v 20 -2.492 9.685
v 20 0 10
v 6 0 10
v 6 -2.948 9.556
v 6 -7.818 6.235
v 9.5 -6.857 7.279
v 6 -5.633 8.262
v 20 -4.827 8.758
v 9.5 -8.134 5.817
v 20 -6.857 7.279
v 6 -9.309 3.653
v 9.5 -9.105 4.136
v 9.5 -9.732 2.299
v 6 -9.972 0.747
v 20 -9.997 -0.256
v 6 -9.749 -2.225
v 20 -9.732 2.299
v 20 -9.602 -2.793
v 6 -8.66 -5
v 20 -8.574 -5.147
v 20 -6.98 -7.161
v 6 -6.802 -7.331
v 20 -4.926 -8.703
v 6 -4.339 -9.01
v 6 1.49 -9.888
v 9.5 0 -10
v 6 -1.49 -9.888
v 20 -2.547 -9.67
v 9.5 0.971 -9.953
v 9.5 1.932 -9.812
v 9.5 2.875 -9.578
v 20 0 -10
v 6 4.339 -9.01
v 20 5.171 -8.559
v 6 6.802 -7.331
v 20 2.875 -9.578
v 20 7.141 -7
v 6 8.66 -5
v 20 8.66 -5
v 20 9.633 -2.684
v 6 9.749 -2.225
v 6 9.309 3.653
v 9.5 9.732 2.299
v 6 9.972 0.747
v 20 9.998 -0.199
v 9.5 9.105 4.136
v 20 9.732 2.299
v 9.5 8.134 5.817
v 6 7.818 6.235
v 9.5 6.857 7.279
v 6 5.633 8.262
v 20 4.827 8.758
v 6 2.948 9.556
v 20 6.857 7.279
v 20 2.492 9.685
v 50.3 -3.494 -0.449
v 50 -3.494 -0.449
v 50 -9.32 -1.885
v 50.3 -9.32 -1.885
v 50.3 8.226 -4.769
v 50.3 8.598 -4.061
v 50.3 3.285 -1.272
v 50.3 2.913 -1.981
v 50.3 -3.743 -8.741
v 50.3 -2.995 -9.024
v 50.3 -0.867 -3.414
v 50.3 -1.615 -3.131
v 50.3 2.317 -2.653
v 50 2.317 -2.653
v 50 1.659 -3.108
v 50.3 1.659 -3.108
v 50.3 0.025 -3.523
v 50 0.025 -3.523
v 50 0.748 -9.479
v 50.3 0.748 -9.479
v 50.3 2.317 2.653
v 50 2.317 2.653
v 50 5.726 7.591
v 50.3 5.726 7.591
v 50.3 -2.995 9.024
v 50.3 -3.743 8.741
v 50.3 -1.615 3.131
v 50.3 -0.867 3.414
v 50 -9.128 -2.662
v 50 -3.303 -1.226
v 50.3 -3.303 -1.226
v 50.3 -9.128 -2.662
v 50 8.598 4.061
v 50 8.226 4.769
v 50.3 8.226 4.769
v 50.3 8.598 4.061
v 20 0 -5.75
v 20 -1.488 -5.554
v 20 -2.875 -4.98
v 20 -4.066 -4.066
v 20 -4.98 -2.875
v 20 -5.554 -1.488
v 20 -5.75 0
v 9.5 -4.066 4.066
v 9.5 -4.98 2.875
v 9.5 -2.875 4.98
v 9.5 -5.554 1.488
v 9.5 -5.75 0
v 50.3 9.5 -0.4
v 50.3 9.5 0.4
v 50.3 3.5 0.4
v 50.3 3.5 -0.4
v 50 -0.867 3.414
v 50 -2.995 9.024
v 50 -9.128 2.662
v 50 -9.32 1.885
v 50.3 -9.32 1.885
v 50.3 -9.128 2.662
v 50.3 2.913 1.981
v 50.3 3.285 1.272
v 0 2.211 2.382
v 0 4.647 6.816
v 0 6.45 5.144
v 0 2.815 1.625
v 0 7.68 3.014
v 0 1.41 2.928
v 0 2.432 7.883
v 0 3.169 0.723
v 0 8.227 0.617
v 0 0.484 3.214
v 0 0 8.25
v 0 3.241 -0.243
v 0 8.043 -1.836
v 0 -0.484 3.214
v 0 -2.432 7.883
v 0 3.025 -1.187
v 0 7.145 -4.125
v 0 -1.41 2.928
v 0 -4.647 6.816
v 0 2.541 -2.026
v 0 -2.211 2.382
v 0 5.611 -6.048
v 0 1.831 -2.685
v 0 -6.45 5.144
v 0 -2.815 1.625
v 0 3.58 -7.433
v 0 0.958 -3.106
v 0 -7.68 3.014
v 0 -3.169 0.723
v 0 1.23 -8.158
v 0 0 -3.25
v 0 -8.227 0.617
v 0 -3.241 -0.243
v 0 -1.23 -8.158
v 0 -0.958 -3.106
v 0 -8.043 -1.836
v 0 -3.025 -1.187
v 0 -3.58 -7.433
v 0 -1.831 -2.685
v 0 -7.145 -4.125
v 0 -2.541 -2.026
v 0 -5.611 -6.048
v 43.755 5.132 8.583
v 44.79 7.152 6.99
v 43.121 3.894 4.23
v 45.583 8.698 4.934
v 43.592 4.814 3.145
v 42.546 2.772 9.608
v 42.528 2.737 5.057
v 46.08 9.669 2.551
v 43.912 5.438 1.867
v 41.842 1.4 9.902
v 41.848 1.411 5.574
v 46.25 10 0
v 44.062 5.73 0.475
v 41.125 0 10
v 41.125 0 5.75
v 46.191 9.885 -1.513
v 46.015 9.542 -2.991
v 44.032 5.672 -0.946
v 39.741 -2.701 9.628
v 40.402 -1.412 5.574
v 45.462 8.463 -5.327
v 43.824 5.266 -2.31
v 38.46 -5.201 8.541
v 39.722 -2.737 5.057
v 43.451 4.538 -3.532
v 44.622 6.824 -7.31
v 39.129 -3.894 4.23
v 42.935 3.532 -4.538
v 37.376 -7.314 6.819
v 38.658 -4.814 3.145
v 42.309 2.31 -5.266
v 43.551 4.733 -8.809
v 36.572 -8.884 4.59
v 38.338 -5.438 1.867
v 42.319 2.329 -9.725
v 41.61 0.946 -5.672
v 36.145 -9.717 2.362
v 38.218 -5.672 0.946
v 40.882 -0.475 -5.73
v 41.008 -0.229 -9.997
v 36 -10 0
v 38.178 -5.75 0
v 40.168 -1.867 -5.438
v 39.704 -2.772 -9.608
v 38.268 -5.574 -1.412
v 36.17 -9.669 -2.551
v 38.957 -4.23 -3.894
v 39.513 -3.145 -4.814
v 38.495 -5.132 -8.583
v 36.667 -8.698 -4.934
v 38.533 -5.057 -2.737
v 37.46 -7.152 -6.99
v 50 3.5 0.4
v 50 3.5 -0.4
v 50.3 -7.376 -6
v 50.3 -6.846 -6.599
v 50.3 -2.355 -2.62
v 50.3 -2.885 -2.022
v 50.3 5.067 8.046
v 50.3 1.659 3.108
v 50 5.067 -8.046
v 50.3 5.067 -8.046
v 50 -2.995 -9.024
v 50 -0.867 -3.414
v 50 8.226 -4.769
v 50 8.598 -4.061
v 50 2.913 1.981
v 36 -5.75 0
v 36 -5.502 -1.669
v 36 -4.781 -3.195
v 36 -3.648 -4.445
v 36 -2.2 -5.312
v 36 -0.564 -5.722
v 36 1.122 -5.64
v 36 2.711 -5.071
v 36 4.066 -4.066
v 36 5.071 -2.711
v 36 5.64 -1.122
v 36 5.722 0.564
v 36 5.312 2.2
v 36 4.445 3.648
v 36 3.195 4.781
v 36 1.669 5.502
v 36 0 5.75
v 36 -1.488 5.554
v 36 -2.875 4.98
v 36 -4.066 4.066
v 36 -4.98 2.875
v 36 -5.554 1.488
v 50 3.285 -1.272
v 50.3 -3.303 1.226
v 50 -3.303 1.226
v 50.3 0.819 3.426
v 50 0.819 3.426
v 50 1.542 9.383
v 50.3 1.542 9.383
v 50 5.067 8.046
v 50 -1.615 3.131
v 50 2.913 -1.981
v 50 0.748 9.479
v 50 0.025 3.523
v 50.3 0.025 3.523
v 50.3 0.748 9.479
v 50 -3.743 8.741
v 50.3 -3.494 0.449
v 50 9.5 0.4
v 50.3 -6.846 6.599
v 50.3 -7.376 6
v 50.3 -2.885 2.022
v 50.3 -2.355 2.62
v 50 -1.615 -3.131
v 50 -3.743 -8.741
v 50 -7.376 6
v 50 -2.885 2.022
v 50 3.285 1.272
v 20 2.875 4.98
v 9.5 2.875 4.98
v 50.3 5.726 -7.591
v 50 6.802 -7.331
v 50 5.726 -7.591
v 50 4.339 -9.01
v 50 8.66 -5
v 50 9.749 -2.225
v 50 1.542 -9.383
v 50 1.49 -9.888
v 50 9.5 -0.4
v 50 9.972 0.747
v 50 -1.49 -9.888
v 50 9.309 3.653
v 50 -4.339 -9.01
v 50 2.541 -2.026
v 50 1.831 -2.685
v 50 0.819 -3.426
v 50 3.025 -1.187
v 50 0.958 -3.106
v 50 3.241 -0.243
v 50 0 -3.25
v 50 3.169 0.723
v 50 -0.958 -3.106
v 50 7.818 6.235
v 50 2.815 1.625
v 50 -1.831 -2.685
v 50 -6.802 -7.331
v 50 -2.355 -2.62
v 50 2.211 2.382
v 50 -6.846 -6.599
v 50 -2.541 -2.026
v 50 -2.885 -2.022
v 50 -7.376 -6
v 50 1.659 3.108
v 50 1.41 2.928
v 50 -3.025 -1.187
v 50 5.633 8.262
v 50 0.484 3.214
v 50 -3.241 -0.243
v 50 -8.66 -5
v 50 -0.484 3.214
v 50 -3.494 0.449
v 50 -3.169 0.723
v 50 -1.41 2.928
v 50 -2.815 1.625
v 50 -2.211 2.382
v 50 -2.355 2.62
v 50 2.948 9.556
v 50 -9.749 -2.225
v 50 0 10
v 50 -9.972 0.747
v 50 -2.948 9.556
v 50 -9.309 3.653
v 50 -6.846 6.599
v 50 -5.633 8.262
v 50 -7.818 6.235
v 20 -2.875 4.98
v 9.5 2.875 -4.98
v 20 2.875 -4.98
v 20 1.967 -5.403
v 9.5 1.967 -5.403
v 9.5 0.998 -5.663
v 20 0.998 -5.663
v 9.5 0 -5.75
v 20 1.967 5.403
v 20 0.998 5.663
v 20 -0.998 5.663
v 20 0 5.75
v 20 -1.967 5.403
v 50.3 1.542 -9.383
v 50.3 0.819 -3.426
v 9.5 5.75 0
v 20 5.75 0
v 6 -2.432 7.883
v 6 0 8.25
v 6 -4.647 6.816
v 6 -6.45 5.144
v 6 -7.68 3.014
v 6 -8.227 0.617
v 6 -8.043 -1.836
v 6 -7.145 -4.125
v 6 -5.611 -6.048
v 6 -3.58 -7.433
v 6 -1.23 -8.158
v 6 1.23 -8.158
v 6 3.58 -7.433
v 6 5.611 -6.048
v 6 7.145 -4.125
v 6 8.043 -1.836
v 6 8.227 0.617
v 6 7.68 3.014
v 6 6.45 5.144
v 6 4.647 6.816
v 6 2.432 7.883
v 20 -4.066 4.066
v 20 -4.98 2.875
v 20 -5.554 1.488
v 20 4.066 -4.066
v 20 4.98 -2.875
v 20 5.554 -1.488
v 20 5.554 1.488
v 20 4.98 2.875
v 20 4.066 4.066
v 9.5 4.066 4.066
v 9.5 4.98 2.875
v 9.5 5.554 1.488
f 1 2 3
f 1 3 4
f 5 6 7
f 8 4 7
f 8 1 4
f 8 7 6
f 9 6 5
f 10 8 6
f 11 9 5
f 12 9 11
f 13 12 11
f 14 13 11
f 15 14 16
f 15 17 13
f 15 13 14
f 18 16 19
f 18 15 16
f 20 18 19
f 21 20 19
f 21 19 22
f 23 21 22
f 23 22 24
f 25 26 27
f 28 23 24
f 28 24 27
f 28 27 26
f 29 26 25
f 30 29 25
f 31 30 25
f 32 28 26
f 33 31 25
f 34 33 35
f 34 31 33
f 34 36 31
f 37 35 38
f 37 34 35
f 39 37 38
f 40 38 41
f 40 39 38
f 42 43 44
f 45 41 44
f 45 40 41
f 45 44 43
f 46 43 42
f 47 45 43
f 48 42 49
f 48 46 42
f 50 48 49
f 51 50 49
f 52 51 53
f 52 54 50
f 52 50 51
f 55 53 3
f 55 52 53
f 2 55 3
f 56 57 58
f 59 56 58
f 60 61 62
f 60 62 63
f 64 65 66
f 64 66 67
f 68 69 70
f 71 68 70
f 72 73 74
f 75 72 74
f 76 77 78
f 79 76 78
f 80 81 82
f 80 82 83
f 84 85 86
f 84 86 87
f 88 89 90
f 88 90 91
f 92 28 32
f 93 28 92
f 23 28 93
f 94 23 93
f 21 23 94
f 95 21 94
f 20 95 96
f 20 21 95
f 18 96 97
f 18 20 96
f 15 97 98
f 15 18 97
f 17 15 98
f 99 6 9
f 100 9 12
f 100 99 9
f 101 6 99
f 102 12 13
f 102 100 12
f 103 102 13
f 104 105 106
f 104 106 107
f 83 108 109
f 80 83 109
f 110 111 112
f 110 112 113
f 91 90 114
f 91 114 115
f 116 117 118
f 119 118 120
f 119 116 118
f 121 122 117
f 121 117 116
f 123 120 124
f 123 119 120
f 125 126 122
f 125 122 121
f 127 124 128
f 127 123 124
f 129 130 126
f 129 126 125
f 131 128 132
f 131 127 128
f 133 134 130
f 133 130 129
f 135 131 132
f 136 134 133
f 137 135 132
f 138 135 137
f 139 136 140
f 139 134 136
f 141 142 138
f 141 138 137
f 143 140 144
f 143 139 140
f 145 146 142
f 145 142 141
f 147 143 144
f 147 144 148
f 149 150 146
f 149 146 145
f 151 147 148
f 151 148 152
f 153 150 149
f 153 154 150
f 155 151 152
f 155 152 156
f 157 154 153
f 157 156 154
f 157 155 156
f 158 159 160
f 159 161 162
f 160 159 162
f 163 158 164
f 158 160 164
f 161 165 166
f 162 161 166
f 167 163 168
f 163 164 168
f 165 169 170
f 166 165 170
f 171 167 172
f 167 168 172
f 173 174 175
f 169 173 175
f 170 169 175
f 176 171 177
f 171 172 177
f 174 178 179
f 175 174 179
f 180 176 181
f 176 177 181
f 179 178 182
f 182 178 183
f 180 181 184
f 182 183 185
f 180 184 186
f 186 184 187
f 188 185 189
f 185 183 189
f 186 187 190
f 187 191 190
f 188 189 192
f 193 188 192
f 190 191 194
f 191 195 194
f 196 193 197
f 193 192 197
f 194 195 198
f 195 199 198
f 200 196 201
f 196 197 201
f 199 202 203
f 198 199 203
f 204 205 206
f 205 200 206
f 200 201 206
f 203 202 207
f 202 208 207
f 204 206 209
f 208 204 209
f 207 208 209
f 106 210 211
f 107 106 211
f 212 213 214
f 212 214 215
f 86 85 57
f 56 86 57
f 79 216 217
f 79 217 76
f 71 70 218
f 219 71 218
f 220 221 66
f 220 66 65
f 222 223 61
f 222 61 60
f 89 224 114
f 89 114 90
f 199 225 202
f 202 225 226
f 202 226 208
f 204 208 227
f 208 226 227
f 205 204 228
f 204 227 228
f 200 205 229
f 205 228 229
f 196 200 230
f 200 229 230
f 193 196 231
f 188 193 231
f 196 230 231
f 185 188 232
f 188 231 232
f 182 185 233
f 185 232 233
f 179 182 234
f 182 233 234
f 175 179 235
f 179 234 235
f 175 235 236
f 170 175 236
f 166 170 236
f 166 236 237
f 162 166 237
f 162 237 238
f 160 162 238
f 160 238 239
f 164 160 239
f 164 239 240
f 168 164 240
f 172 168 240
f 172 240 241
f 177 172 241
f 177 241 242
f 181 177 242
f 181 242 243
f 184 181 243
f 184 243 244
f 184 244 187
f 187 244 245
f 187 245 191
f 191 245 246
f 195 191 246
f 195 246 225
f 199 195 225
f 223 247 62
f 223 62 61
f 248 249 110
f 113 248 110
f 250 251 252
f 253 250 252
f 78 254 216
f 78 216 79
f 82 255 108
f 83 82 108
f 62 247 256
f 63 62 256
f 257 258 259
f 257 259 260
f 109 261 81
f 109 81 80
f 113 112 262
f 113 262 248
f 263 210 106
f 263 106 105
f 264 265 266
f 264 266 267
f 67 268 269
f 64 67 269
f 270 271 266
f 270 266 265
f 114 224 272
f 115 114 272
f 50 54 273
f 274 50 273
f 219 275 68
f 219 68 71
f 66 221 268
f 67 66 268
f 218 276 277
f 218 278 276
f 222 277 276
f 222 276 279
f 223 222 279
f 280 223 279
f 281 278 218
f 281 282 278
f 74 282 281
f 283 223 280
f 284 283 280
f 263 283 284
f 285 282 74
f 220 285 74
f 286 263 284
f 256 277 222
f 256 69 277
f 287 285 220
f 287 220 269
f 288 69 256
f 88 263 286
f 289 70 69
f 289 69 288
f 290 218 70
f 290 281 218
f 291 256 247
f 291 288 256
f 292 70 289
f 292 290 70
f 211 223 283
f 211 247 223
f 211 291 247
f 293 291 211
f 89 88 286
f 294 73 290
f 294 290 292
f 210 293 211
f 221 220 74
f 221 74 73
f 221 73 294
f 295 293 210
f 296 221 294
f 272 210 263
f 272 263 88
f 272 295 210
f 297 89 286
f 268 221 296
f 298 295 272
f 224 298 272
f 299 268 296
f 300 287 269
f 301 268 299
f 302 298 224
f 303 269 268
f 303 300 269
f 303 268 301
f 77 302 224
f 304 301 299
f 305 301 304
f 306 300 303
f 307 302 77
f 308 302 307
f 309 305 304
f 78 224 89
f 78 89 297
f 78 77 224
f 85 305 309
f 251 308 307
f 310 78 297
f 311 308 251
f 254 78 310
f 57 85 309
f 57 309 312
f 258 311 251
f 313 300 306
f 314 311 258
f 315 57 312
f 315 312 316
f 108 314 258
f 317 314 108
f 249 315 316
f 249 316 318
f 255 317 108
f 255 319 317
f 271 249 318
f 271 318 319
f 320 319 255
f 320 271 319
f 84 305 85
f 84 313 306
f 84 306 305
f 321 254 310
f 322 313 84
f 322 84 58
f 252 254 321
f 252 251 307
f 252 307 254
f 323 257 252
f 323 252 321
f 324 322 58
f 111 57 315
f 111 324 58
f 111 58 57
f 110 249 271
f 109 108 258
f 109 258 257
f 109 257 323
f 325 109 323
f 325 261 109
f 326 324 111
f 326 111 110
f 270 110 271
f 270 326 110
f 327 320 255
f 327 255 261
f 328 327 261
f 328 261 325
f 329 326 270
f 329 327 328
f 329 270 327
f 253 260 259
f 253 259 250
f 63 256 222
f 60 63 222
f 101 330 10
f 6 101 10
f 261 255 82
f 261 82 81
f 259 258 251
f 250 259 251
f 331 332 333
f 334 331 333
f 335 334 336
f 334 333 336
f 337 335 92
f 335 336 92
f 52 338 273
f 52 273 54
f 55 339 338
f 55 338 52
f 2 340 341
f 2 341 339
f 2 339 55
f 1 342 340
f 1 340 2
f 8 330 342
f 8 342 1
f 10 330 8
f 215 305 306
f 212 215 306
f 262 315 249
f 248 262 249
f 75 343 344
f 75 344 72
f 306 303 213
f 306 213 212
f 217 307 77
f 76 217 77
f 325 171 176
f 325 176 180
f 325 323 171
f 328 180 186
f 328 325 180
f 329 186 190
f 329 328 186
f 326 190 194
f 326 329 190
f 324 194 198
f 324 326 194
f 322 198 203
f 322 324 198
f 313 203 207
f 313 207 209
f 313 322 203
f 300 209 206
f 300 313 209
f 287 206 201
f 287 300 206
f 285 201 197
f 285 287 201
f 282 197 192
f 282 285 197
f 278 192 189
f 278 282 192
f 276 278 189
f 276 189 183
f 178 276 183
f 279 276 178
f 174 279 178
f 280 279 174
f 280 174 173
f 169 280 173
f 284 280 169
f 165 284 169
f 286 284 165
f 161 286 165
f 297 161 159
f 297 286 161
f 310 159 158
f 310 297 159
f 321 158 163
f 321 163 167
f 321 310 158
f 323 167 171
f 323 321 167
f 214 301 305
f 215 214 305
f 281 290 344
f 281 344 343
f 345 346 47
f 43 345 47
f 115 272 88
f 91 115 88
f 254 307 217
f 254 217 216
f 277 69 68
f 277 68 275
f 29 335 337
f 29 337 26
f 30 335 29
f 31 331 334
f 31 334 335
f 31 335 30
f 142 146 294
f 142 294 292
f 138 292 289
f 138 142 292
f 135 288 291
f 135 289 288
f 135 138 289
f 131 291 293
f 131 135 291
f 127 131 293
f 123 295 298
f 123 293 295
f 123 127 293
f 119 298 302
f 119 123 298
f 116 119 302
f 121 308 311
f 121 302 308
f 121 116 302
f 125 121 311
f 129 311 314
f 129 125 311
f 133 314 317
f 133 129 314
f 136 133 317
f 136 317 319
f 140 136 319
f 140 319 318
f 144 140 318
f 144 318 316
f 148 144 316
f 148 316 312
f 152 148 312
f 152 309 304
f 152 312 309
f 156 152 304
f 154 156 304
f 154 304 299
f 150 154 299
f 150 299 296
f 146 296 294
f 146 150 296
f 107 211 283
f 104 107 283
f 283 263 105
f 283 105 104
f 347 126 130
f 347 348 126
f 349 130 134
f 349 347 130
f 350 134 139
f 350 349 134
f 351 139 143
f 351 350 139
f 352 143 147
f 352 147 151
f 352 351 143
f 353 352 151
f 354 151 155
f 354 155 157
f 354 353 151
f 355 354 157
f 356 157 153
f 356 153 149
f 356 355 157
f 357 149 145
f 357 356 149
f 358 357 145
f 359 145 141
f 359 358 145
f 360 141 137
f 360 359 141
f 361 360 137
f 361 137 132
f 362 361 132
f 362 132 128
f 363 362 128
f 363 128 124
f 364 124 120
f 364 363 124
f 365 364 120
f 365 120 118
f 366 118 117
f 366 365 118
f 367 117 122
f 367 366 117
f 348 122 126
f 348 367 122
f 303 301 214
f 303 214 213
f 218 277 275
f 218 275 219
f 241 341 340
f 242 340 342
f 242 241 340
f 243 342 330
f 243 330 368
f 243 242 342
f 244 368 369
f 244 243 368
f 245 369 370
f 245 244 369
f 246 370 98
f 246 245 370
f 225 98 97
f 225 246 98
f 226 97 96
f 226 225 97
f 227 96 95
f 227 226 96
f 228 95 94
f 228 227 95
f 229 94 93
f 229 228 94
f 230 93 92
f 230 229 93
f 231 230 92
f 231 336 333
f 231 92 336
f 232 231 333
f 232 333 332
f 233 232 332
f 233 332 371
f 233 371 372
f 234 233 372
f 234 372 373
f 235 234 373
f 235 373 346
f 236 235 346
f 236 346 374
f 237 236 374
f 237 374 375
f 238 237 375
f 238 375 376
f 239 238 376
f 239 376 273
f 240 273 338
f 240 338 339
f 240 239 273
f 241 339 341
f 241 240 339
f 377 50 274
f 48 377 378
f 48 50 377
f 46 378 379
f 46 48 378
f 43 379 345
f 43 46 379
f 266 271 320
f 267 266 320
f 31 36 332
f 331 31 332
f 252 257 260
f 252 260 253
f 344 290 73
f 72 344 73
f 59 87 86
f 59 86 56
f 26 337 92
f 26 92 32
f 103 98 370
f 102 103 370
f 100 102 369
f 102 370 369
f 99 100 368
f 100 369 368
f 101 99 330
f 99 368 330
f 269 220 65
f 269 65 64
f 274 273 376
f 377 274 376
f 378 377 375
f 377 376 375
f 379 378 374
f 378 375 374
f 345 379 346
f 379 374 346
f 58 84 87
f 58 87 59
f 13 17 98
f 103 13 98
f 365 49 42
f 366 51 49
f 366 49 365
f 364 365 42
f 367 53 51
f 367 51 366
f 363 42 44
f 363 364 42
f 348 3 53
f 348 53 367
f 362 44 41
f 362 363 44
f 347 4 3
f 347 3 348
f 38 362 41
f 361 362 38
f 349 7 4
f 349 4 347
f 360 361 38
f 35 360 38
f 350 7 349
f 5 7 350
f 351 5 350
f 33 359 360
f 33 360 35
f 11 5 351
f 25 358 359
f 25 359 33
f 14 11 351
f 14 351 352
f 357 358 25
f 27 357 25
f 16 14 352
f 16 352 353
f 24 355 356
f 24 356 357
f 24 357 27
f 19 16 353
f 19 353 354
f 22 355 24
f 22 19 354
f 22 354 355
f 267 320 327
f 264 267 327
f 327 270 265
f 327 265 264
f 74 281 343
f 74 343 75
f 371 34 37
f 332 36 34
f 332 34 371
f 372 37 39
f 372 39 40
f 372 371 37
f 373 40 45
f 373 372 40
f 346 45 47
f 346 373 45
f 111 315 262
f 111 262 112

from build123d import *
from build123d.topology import SkipClean

# Parameters (mm, degrees)
CUT_EXTRUDE_1_DEPTH      = 10.5
CUT_EXTRUDE_2_DEPTH      = 52.961524227
CUT_EXTRUDE_2_DEPTH_BACK = 52.961524227
EXTRUDE_1_REACH          = 40.678
SKETCH_4_R               = 5.75
CUT_EXTRUDE_3_DEPTH      = 52.961524227
CUT_EXTRUDE_3_DEPTH_BACK = 52.961524227
SKETCH_5_R               = 3.25
SKETCH_6_W               = 0.8
SKETCH_6_H               = 6
EXTRUDE_2_DEPTH          = 0.3
PATTERN_CIRCULAR_1_COUNT = 13


with BuildPart() as part:
    # 草图1 → 旋转1 (revolve)
    with BuildSketch(Plane.XY):
        Polygon((36, 0), (0, 0), (0, -8.25), (6, -8.25), (6, -10), (20, -10), (20, -5.75), (36, -5.75), align=None)
    revolve(axis=Axis((0, 0, 0), (1, 0, 0)))

    # 草图2 → 切除-拉伸1 (cut)
    with SkipClean():  # the faces are left unmerged after this step: merging them gives an invalid solid
        with BuildSketch(Plane(origin=(20, 0, 0), x_dir=(0, 0, -1), z_dir=(1, 0, 0))):
            with BuildLine():
                ThreePointArc((4.979646072, 2.875), (5.554073501, 1.488209509), (5.75, 0))
                Line((5.75, 0), (10, 0))
                ThreePointArc((10, 0), (9.893888613, 1.452917105), (9.577806377, 2.875))
                Line((9.577806377, 2.875), (4.979646072, 2.875))
            make_face()
            with BuildLine():
                ThreePointArc((-4.979646072, 2.875), (-2.875, 4.979646072), (0, 5.75))
                Line((0, 5.75), (-2.299080153, 9.732123635))
                ThreePointArc((-2.299080153, 9.732123635), (-5, 8.660254038), (-7.278726225, 6.857123635))
                Line((-7.278726225, 6.857123635), (-4.979646072, 2.875))
            make_face()
            with BuildLine():
                Line((-2.299080153, -9.732123635), (0, -5.75))
                ThreePointArc((0, -5.75), (-2.875, -4.979646072), (-4.979646072, -2.875))
                Line((-4.979646072, -2.875), (-7.278726225, -6.857123635))
                ThreePointArc((-7.278726225, -6.857123635), (-5, -8.660254038), (-2.299080153, -9.732123635))
            make_face()
        extrude(amount=-CUT_EXTRUDE_1_DEPTH, mode=Mode.SUBTRACT)


with BuildPart() as body_2:
    # 草图1<3> → 旋转2 (revolve)
    with BuildSketch(Plane.XY):
        Polygon((50, 0), (36, 0), (36, -5.75), (36, -10), (50, -10), align=None)
    revolve(axis=Axis((0, 0, 0), (1, 0, 0)))

    # 草图3 → 切除-拉伸2 (cut, two sides: drawn at the far end of the back side and taken through both)
    with BuildSketch(Plane.XY.offset(-CUT_EXTRUDE_2_DEPTH_BACK)):
        Polygon((36, -10), (36, 10), (46.25, 10), align=None)
    extrude(amount=CUT_EXTRUDE_2_DEPTH + CUT_EXTRUDE_2_DEPTH_BACK, mode=Mode.SUBTRACT)

    # 草图4 → 凸台-拉伸1 (add, up to next)
    with BuildSketch(Plane(origin=(36, 0, 0), x_dir=(0, 0, -1), z_dir=(1, 0, 0)), mode=Mode.PRIVATE) as extrude_1_sk1:
        Circle(SKETCH_4_R)
    extrude_1_tool1 = extrude(extrude_1_sk1.sketch, amount=EXTRUDE_1_REACH, mode=Mode.PRIVATE) - body_2.part

    add(part.part)  # 凸台-拉伸1 merges part
    add(extrude_1_tool1.solids().sort_by_distance((36, 0, 0))[0])

    # 草图5 → 切除-拉伸3 (cut, two sides: drawn at the far end of the back side and taken through both)
    with BuildSketch(Plane(origin=(50, 0, 0), x_dir=(0, 0, -1), z_dir=(1, 0, 0)).offset(-CUT_EXTRUDE_3_DEPTH_BACK)):
        Circle(SKETCH_5_R)
    extrude(amount=CUT_EXTRUDE_3_DEPTH + CUT_EXTRUDE_3_DEPTH_BACK, mode=Mode.SUBTRACT)

    # 草图6 → 凸台-拉伸2 (add)
    with BuildSketch(Plane(origin=(50, 0, 0), x_dir=(0, 0, -1), z_dir=(1, 0, 0))):
        with Locations((0, 6.5)):
            Rectangle(SKETCH_6_W, SKETCH_6_H)
    extrude_2 = extrude(amount=EXTRUDE_2_DEPTH)

    # 阵列(圆周)1: 凸台-拉伸2 ×13 about axis
    pattern_circular_1_axis = Axis((50, 0, 0), (-1, 0, 0))
    for i in range(1, PATTERN_CIRCULAR_1_COUNT):
        add(extrude_2.rotate(pattern_circular_1_axis, i * 360 / PATTERN_CIRCULAR_1_COUNT))


solid = body_2.part
